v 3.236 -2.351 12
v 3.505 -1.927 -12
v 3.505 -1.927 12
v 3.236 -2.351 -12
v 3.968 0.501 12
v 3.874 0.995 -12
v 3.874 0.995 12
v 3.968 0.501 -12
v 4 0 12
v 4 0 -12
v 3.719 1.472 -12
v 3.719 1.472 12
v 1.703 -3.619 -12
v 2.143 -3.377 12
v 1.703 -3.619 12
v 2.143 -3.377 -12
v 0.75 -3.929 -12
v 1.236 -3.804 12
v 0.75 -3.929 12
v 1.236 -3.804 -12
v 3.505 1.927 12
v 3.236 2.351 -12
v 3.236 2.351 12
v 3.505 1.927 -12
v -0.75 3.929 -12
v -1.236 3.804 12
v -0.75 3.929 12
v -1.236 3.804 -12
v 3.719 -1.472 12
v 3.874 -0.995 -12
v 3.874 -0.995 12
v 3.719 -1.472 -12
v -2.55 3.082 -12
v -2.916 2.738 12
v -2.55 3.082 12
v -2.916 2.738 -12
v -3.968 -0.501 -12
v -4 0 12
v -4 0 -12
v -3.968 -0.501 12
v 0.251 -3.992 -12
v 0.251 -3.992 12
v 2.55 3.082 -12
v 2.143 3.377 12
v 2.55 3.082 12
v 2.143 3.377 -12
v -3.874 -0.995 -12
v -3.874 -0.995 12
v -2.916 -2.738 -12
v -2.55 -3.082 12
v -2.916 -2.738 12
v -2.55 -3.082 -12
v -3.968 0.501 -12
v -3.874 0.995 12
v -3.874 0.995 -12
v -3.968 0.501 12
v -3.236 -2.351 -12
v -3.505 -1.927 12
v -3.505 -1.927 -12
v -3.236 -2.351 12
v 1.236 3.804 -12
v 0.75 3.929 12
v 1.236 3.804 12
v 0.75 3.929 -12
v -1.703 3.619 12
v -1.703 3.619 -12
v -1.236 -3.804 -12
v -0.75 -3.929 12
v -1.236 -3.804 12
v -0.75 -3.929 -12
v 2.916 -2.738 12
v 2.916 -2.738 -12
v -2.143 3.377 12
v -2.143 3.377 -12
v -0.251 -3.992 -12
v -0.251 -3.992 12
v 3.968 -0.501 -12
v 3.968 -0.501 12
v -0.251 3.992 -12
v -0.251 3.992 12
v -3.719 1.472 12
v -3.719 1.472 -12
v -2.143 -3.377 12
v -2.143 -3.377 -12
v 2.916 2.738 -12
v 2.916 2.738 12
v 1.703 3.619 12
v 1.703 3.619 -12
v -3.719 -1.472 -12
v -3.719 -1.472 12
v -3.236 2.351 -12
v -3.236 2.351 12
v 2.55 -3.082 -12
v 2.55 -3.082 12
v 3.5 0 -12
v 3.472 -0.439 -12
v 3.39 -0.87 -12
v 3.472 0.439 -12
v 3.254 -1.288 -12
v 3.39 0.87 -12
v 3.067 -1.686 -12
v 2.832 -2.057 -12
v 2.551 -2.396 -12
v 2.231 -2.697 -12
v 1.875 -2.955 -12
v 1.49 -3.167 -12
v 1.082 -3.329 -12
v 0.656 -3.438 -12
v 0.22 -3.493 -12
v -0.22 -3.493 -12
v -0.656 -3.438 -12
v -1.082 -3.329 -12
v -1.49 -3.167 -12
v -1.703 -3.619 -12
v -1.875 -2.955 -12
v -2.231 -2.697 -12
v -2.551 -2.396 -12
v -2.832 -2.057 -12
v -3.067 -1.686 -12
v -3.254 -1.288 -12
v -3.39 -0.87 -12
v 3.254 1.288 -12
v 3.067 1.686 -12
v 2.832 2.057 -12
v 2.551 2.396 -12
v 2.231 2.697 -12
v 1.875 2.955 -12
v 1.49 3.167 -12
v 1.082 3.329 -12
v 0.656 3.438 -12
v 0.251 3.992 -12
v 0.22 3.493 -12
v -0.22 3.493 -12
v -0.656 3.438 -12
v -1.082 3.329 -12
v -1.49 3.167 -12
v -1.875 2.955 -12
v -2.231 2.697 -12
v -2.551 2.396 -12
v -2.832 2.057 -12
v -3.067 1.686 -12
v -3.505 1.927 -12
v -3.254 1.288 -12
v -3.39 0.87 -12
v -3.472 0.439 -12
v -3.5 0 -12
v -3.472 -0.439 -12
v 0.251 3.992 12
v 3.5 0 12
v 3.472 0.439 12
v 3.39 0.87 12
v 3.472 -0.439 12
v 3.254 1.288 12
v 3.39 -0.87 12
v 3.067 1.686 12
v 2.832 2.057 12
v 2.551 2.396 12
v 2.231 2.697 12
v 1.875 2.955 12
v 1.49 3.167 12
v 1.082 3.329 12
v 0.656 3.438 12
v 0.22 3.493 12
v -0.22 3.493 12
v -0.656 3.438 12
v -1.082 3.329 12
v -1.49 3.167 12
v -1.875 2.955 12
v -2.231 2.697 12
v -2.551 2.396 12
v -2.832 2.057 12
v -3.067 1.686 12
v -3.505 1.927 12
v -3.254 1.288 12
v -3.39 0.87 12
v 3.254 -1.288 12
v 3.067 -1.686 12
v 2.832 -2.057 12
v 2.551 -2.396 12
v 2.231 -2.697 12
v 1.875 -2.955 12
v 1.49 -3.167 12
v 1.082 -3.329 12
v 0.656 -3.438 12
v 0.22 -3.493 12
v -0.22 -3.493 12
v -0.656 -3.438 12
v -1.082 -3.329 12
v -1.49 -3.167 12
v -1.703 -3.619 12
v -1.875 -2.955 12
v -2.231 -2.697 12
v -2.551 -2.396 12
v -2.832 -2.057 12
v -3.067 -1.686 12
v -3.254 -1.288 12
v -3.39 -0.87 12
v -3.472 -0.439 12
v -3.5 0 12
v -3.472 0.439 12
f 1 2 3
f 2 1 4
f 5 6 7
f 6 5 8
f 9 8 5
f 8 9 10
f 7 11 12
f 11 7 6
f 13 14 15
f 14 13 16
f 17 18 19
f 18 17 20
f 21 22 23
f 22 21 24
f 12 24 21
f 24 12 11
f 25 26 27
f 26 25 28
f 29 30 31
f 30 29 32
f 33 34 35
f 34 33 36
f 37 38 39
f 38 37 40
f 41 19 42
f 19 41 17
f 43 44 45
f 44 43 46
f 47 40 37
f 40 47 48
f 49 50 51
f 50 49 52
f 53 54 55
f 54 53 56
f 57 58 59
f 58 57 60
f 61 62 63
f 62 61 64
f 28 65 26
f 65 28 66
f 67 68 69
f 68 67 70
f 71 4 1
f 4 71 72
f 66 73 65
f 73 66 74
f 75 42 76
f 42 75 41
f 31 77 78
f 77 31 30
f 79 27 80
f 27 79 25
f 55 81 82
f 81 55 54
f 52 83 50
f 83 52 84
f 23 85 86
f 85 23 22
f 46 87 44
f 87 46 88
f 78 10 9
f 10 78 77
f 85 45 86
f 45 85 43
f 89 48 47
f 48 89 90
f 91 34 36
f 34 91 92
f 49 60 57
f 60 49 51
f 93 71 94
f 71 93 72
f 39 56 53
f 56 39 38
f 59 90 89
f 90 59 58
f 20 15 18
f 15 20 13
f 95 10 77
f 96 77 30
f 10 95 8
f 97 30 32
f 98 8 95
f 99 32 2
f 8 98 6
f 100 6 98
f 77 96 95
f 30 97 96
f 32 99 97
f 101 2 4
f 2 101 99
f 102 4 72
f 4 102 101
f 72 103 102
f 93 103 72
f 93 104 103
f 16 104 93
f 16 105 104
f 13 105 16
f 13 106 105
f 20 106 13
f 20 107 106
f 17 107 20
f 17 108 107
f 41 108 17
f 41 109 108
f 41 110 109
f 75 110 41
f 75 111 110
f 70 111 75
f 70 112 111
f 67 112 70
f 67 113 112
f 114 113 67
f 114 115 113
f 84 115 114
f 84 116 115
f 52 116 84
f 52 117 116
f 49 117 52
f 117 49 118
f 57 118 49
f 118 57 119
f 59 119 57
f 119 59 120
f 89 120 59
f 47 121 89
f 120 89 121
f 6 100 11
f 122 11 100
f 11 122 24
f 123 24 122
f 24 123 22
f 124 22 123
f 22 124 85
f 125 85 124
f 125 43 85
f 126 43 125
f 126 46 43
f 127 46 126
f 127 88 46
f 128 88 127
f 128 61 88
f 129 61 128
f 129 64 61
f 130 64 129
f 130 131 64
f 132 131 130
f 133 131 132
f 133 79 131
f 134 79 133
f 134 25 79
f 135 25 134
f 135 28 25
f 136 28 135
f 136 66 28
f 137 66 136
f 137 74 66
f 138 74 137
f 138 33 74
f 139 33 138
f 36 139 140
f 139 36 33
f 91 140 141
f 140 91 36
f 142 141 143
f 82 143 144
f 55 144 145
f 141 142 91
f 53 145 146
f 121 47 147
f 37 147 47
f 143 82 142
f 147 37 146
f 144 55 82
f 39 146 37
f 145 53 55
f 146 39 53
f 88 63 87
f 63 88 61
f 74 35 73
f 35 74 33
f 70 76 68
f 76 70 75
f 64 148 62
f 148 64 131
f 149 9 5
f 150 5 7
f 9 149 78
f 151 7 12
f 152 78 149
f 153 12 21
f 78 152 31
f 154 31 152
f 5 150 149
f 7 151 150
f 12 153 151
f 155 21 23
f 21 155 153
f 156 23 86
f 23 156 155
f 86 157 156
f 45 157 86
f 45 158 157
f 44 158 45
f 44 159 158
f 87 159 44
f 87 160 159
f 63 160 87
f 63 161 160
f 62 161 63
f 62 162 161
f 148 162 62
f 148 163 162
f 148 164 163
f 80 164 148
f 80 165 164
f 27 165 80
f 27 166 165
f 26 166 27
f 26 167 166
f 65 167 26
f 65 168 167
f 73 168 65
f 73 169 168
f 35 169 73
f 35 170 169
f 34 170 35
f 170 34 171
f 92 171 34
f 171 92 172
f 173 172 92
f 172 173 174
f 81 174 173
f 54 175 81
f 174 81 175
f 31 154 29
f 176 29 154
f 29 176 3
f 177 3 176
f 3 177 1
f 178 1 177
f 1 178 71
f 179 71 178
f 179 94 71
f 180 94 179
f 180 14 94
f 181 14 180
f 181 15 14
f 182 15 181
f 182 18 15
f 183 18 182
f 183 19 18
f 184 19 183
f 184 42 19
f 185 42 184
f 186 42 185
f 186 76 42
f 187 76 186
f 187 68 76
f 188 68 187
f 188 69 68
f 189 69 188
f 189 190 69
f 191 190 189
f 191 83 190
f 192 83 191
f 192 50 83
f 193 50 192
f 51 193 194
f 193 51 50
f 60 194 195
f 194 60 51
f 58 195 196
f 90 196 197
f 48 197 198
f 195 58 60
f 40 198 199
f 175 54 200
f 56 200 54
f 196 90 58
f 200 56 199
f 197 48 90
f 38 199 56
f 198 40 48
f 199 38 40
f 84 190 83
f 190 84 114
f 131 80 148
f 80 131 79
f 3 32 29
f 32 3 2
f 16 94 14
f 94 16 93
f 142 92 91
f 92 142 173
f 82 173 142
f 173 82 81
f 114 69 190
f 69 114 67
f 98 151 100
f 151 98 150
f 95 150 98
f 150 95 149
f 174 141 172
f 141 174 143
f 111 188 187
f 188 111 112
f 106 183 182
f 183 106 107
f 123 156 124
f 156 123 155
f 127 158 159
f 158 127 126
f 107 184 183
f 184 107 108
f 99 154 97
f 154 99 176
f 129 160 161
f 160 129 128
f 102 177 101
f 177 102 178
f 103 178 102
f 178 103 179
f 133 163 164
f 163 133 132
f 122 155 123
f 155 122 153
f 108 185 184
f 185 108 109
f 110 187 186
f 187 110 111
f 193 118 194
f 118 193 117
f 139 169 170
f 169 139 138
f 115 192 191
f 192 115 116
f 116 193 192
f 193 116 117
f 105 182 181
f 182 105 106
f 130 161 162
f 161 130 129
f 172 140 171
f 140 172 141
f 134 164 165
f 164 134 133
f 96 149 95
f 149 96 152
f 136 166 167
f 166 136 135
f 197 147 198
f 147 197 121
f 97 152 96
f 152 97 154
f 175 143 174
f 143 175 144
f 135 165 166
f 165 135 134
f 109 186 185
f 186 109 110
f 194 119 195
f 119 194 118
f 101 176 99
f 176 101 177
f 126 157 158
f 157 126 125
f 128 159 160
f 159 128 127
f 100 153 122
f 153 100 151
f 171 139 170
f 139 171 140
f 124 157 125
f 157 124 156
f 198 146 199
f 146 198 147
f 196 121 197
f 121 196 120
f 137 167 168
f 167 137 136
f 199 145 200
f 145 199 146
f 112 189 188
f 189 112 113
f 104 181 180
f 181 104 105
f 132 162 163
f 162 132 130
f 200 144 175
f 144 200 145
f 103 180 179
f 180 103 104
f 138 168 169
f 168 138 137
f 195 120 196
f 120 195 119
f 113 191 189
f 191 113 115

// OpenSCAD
$fn = 50;


difference() {
	union() {
		translate(v = [0, 0, -12.0000000000]) {
			cylinder(h = 24, r = 4.0000000000);
		}
	}
	union() {
		translate(v = [0, 0, -100.0000000000]) {
			cylinder(h = 200, r = 3.5000000000);
		}
	}
}
